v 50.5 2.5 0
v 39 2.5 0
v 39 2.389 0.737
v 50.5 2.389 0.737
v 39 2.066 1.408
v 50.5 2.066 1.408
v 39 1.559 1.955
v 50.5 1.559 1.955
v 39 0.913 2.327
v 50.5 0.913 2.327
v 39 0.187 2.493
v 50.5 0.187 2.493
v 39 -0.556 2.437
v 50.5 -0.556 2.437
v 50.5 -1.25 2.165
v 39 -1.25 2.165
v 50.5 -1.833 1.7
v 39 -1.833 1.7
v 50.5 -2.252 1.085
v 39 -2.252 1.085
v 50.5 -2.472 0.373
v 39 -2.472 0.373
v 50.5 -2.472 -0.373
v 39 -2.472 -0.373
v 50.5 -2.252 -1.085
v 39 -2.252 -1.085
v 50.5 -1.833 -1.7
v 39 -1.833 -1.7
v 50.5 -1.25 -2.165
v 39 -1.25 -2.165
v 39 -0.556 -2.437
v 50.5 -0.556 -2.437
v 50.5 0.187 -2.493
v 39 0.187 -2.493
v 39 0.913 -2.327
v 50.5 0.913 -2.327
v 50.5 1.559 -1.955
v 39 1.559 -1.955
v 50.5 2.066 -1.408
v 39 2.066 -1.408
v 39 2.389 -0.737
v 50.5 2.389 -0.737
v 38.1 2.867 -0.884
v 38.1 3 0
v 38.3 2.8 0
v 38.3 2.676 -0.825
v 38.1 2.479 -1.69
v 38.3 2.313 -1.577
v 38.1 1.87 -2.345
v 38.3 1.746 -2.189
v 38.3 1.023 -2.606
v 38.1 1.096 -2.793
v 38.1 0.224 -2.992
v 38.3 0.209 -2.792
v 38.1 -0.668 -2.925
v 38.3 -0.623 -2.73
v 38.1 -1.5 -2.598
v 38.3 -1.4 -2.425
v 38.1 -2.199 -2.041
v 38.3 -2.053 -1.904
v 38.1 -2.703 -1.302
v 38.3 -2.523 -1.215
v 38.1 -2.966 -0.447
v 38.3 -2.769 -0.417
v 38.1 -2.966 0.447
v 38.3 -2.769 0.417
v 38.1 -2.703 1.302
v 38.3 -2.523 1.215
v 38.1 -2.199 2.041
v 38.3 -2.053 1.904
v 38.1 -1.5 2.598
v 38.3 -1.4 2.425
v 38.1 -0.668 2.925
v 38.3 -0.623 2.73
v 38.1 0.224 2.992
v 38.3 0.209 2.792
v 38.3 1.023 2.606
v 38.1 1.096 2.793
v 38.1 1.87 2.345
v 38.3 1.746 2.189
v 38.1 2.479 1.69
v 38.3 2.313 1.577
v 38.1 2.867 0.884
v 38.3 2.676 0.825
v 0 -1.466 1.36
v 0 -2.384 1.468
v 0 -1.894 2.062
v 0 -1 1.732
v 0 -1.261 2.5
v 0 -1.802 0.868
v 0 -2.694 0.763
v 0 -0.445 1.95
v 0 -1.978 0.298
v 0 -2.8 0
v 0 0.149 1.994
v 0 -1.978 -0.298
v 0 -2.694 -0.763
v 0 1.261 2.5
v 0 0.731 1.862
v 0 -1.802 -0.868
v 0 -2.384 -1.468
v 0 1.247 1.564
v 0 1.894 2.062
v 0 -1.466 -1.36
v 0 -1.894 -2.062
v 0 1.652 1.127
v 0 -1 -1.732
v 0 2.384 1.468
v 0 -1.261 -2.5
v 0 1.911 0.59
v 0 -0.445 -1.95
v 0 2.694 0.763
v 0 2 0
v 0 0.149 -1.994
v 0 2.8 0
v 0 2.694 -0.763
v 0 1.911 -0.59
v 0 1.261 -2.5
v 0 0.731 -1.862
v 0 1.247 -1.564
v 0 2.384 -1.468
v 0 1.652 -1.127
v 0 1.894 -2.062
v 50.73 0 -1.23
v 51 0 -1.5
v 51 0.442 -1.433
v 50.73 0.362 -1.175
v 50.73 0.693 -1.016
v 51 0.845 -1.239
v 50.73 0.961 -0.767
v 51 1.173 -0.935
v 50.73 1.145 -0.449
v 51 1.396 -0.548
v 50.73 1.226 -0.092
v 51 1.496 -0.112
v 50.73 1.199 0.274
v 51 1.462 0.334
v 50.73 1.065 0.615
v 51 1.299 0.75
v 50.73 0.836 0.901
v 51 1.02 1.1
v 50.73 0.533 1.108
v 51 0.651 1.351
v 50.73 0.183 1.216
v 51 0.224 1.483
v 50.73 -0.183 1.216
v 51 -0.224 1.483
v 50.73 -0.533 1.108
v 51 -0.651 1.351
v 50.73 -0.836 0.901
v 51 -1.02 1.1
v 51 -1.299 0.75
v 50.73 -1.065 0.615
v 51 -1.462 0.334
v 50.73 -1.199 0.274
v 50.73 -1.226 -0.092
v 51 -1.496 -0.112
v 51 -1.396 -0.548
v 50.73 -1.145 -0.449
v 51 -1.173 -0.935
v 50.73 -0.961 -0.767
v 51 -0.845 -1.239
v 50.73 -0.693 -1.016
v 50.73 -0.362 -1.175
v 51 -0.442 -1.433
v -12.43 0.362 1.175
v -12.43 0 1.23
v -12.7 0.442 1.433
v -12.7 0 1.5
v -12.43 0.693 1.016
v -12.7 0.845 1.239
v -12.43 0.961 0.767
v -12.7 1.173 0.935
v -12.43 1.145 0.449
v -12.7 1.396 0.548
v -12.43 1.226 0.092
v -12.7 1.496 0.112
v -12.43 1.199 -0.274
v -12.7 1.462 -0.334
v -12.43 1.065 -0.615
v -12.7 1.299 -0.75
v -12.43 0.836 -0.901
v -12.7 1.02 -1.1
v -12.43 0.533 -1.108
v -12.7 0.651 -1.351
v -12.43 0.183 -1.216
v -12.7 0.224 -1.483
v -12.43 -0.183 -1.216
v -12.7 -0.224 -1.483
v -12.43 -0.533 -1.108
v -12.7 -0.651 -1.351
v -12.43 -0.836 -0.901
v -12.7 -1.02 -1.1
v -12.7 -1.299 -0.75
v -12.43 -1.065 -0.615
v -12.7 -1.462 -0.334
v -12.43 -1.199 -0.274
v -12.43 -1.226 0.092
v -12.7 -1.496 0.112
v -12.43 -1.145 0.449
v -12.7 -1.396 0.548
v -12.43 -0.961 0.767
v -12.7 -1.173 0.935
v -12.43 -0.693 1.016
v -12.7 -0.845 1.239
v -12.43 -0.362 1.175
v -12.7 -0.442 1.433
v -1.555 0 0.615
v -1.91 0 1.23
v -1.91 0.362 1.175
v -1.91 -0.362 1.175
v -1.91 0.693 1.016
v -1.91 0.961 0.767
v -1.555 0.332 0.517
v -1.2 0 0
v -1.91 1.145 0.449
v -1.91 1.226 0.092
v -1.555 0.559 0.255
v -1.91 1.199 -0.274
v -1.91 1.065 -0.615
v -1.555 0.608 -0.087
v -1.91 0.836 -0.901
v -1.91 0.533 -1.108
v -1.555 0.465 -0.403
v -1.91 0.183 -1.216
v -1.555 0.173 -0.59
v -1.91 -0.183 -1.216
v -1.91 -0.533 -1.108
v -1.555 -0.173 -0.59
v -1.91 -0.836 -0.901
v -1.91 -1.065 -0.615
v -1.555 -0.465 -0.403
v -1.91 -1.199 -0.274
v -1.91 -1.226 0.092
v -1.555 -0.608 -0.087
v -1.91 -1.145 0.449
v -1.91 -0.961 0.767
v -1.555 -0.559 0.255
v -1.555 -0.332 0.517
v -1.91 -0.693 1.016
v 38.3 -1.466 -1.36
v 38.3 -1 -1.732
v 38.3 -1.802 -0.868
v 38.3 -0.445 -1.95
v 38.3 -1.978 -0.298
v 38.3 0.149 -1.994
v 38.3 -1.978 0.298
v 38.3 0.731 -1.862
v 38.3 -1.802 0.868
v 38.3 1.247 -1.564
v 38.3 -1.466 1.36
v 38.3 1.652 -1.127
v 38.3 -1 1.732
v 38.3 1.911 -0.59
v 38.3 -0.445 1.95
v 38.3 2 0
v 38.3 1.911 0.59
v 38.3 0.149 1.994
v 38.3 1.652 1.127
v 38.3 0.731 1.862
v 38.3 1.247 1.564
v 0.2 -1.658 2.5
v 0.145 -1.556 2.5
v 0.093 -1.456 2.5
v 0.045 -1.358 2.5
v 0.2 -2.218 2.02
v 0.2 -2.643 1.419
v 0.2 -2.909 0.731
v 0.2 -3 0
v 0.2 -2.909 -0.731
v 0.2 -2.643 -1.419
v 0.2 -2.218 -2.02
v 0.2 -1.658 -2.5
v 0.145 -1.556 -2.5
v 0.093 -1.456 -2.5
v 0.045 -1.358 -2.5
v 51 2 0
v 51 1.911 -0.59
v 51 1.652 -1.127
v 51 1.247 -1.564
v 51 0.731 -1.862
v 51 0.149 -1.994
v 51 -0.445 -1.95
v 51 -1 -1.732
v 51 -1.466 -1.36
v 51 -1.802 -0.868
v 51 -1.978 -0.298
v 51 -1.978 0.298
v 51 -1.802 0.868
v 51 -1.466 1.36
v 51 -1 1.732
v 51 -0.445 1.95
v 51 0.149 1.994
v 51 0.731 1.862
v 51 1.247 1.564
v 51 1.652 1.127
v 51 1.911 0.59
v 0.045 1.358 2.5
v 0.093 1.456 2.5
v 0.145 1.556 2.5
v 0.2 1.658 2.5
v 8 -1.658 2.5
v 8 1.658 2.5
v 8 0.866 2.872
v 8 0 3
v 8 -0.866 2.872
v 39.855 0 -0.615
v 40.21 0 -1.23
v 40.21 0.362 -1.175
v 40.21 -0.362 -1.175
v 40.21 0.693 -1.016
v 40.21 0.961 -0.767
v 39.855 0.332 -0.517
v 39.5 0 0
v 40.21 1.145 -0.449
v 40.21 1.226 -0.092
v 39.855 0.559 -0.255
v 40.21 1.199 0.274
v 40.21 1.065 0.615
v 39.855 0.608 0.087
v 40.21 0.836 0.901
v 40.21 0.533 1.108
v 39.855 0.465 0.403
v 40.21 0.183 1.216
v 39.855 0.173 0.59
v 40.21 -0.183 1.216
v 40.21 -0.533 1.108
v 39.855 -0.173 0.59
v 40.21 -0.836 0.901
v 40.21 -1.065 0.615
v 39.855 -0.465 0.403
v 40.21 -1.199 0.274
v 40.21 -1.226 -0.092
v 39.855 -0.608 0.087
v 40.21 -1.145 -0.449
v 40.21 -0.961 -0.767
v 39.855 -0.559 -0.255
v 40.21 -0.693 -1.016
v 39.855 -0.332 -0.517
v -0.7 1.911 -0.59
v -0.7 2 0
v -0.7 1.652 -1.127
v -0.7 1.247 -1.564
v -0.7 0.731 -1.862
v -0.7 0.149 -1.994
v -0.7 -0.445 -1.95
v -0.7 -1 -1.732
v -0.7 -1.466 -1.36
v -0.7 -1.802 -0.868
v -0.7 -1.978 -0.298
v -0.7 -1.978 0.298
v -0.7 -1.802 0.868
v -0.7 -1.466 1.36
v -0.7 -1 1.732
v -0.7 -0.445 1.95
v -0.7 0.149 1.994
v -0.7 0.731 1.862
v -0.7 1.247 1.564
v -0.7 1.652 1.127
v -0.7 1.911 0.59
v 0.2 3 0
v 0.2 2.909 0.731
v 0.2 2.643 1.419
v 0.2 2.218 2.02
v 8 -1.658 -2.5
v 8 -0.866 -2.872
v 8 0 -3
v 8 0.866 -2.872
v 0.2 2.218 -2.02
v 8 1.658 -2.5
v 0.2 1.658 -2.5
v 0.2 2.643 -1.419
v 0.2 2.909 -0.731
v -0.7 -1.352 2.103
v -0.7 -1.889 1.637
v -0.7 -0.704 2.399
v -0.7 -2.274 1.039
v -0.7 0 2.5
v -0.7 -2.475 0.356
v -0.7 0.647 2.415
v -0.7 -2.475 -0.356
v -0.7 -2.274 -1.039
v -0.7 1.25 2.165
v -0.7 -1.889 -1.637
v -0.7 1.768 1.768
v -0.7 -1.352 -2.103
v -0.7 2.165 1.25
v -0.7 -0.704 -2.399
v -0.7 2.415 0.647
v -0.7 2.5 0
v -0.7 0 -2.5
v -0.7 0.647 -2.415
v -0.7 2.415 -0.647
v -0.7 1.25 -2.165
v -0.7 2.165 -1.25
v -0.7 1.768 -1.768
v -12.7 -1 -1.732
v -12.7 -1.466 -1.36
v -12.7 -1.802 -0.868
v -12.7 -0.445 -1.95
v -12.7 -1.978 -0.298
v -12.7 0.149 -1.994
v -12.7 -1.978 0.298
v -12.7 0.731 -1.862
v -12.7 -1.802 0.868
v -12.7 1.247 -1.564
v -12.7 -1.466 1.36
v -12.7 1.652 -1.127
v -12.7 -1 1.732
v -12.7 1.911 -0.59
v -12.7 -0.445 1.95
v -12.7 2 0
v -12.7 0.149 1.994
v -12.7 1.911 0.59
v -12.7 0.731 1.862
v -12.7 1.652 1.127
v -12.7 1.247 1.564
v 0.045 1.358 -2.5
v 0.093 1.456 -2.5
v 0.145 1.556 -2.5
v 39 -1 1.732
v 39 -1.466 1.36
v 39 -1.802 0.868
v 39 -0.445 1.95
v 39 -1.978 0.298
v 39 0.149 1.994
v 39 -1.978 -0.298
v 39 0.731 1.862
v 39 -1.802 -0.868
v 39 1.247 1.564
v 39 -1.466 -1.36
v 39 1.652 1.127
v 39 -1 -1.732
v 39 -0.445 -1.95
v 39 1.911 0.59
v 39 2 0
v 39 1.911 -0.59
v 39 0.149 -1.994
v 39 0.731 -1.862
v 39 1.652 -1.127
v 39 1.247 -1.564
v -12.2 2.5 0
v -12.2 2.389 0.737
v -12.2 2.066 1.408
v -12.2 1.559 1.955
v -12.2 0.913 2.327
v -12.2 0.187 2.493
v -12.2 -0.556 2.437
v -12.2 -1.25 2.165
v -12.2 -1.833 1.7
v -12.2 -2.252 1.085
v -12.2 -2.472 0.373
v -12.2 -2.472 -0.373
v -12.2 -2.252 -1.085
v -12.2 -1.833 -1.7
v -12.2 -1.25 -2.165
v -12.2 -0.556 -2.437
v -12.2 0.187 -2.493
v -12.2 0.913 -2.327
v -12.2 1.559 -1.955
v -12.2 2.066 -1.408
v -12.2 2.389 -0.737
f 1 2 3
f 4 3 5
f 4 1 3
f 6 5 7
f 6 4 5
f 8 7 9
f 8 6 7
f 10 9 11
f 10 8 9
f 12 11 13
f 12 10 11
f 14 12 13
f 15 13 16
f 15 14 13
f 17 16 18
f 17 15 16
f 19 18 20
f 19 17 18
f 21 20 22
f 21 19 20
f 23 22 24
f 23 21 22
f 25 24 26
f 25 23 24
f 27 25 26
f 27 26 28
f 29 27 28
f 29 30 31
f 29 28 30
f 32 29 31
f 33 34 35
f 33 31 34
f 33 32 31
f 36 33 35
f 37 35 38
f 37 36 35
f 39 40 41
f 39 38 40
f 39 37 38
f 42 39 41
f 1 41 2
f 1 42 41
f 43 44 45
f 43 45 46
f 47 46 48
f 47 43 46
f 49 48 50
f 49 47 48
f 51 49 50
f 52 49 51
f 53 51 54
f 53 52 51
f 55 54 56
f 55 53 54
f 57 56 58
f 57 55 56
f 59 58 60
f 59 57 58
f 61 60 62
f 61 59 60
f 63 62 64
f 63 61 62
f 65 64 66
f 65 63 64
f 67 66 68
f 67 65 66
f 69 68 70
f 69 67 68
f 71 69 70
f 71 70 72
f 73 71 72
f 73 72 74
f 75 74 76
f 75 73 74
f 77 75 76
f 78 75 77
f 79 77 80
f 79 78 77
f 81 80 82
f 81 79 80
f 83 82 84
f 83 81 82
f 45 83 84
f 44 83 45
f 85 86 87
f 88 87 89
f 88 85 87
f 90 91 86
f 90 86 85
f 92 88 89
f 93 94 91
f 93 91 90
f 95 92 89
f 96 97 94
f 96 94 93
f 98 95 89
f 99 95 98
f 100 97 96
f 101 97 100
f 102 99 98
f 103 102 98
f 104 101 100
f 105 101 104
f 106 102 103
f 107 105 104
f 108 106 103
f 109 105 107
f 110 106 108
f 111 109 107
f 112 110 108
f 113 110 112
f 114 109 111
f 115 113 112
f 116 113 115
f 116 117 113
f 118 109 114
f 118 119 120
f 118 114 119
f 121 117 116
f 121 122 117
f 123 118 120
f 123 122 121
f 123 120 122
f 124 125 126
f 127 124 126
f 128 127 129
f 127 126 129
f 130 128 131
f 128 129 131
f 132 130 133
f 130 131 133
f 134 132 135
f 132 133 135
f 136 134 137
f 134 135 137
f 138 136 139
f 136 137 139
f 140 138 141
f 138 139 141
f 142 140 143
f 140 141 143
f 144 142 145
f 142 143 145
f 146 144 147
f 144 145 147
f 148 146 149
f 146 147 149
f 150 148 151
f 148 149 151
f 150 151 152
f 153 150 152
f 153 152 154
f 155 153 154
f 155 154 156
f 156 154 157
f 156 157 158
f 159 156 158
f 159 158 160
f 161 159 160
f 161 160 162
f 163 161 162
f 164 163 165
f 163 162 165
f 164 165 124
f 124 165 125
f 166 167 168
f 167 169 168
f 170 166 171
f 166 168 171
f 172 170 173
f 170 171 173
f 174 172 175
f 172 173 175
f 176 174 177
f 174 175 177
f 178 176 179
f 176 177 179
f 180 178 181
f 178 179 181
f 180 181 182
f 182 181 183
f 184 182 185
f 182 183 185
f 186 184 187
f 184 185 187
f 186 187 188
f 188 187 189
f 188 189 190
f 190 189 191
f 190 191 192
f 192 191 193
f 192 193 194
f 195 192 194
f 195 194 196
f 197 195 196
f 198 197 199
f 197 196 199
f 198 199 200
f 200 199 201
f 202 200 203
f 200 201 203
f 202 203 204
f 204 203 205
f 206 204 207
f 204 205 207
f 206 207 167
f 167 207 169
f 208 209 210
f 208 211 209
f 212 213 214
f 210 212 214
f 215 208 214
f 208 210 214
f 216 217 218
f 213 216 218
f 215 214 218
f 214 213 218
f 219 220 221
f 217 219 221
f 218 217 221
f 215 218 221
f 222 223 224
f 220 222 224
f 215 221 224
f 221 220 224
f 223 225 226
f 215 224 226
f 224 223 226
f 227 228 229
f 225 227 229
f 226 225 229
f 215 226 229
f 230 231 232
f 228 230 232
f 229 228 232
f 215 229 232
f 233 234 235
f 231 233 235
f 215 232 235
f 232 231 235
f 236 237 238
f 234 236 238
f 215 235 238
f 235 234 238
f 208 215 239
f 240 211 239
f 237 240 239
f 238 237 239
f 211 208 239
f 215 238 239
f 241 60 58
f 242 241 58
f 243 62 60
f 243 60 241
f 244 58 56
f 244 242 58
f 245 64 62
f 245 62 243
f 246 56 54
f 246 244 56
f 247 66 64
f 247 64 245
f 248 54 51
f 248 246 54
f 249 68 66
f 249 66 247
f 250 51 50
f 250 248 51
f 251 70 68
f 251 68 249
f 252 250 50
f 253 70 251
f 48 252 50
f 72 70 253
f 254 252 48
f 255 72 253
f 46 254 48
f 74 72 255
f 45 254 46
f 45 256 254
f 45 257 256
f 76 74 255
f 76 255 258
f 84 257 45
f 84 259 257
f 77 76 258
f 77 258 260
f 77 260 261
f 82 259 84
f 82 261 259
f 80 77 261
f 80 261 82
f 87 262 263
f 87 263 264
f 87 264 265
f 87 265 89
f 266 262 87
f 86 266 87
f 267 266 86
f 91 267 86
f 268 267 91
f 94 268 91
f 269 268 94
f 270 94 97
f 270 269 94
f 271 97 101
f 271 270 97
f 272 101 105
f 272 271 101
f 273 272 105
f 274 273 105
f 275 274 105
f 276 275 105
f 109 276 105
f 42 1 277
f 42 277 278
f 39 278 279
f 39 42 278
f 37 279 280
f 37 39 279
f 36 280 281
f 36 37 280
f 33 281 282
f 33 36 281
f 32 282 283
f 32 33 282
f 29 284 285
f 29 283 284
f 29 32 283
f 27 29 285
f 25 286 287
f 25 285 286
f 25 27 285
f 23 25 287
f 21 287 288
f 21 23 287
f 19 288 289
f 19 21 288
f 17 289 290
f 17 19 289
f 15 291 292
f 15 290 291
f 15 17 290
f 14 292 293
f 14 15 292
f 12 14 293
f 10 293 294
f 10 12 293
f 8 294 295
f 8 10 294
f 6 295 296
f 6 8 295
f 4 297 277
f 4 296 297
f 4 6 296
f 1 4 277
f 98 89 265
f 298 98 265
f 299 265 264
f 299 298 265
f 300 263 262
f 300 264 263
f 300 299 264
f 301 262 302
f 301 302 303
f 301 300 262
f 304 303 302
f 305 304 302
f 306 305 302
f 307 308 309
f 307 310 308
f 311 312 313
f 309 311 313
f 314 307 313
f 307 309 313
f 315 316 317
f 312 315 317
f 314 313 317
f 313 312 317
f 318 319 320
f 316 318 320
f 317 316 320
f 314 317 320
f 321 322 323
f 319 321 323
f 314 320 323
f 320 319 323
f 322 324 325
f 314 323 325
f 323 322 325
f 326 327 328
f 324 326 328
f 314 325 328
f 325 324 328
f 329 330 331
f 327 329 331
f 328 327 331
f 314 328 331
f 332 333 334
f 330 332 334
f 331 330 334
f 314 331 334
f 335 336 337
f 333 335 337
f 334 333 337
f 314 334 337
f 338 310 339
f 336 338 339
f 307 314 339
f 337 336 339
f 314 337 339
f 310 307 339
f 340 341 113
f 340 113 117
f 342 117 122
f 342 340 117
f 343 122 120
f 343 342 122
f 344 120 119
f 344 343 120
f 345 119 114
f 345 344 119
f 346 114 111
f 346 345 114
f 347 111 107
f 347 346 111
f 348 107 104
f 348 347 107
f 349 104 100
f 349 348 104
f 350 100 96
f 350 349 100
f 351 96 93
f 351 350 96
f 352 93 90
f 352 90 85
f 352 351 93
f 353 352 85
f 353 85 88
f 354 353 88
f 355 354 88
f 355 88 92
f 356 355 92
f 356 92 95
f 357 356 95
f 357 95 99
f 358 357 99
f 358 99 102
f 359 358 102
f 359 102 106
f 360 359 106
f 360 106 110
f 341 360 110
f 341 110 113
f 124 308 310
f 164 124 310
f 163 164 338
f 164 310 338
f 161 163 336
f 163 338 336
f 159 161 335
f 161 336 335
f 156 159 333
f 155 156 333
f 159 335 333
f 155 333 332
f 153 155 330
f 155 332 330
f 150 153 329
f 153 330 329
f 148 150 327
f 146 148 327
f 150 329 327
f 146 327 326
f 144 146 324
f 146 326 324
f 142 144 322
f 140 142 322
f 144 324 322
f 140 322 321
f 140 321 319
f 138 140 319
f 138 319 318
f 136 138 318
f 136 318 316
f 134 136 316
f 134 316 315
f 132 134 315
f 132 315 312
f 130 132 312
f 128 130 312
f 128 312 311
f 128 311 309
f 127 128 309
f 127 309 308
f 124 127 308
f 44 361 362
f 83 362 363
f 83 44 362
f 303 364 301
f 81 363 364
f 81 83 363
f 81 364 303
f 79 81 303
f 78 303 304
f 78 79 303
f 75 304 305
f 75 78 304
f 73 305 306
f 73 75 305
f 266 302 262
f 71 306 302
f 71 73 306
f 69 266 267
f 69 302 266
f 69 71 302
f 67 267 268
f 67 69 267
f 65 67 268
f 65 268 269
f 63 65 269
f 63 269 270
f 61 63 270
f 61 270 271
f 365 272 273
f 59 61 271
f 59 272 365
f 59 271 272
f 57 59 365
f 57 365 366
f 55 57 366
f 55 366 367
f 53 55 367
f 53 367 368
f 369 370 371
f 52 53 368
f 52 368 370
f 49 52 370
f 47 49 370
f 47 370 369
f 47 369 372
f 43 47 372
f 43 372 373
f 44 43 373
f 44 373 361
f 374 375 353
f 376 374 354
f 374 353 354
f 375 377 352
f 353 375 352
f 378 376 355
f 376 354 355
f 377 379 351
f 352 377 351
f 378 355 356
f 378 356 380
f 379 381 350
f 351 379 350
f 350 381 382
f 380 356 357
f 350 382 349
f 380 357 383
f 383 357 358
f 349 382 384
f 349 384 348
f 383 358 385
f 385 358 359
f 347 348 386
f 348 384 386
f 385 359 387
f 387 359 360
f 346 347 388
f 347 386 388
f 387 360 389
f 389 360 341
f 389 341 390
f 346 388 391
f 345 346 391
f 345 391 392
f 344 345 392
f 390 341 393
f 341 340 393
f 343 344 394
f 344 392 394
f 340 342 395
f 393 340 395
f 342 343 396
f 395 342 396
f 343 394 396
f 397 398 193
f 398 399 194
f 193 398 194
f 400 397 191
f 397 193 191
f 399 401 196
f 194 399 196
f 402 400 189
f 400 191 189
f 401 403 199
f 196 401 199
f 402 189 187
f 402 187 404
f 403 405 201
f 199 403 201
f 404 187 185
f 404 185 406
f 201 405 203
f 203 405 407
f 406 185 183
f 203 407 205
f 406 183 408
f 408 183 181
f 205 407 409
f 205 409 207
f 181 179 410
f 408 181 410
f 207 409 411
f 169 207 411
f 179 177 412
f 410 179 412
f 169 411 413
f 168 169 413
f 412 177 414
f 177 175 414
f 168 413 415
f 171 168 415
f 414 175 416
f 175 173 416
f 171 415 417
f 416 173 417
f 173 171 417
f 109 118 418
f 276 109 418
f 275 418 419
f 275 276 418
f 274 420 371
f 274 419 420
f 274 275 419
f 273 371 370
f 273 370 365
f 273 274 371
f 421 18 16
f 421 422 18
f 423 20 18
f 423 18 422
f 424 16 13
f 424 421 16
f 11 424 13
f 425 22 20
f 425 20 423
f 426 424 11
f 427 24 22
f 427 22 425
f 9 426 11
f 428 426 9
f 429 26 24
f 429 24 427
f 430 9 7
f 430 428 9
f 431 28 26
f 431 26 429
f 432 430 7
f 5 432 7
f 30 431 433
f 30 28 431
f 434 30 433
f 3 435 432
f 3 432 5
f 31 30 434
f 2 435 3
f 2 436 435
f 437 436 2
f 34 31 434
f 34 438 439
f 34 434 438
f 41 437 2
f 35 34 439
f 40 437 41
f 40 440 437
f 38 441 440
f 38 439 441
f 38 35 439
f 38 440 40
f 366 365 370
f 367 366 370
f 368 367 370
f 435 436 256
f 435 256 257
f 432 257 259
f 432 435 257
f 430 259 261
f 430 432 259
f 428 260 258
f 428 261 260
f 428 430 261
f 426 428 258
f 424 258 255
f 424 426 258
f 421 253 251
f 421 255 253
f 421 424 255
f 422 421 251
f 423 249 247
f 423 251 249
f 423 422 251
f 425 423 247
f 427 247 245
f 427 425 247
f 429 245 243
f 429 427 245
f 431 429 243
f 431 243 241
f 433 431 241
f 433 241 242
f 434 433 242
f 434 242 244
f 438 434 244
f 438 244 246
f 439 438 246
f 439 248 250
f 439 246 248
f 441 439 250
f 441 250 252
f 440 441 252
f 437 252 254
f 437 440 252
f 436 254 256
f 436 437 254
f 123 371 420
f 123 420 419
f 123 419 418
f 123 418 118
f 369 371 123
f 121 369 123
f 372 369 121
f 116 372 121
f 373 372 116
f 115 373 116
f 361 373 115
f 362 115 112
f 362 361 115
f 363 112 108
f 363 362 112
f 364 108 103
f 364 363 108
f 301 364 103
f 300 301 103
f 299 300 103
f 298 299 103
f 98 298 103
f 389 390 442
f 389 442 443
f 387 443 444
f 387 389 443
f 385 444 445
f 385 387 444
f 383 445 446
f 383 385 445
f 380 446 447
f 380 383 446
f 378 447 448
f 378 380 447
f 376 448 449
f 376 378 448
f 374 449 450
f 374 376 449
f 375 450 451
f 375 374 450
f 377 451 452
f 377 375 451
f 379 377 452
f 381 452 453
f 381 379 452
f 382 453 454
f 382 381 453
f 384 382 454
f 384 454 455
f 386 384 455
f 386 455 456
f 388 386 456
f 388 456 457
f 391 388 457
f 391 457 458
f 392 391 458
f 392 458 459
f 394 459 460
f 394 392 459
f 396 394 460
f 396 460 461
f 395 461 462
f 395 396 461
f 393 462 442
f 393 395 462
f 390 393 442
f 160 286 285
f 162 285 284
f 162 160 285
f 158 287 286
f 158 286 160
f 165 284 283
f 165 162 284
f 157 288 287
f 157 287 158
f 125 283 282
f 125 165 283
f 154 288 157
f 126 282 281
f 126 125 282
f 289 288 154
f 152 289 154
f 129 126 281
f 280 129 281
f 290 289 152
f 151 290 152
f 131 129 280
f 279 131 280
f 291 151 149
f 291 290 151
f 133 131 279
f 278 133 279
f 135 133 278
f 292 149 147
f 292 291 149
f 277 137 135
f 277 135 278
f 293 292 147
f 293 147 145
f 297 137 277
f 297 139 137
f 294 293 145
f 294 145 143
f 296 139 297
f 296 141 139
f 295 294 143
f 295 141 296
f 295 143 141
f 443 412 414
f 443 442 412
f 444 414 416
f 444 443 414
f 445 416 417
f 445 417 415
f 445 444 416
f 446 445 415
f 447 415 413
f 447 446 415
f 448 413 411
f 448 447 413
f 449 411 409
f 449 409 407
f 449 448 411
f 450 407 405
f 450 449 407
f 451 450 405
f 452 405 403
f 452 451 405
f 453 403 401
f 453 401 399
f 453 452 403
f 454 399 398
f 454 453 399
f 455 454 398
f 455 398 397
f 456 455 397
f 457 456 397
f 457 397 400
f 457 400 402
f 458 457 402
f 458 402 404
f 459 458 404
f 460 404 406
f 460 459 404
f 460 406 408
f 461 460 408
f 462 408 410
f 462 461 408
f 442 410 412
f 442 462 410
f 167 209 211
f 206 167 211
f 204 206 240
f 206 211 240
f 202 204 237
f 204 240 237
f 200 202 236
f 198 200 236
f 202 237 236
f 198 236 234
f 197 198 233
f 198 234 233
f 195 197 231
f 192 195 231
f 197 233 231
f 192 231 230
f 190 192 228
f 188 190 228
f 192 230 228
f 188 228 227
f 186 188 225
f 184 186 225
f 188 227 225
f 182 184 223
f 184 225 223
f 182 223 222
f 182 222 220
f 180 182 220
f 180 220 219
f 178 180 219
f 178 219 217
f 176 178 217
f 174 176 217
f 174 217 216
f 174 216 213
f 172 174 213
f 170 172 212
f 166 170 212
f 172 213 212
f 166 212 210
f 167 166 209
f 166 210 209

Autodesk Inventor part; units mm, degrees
ref_plane "YZ Plane" through (0, 0, 0) normal (1, 0, 0) x (0, 1, 0)
ref_plane "XZ Plane" through (0, 0, 0) normal (0, 1, 0) x (-1, 0, 0)
ref_plane "XY Plane" through (0, 0, 0) normal (0, 0, 1) x (1, 0, 0)
sketch "Sketch_1" plane through (0, 0, 0) normal (0, 0, 1) x (1, 0, 0)
  line L0 (51, 0) -> (-12.7, 0)
  line L1 (-12.7, 0) -> (-12.7, 2)
  line L2 (-12.7, 2) -> (-12.2, 2.5)
  line L3 (-12.2, 2.5) -> (-0.2, 2.5)
  arc A0 (-0.2, 2.5) -> (0, 2.7) centre (-0.2, 2.7) ccw
  line L4 (0, 2.7) -> (0, 2.8)
  line L5 (0, 2.8) -> (0.2, 3)
  line L6 (0.2, 3) -> (38.1, 3)
  line L7 (38.1, 3) -> (38.3, 2.8)
  line L8 (38.3, 2.8) -> (38.3, 2.7)
  arc A1 (38.3, 2.7) -> (38.5, 2.5) centre (38.5, 2.7) ccw
  line L9 (38.5, 2.5) -> (50.5, 2.5)
  line L10 (50.5, 2.5) -> (51, 2)
  line L11 (51, 2) -> (51, 0)
  line L12 (51, 0) -> (-12.7, 0)
  line L13 (38.3, 2.7) -> (38.3, 2)
  line L14 (38.3, 2) -> (39, 2)
  line L15 (39, 2) -> (39, 2.5)
  line L16 (0, 2.7) -> (0, 2)
  line L17 (0, 2) -> (-0.7, 2)
  line L18 (-0.7, 2) -> (-0.7, 2.5)
  dimension "d17" = 0.7
  dimension "d18" = 2
  dimension "d20" = 0.7
  dimension "d21" = 2
revolve "Revolution1" add sketch "Sketch_1" angle 360 about axis through (51, 0, 0) along (1, 0, 0)
sketch "Sketch2" plane through (-12.7, 0, 0) normal (-1, 0, 0) x (0, 0, 1)
  point P0 (0, 0)
hole "Hole1" at (-12.7, 0, 0) direction (1, 0, 0) diameter 2.459 depth 10.7901 tip angle 120 countersink diameter 3 countersink angle 90 thread size "M3x0.5" class "6H" standard "ISO Metric profile"
sketch "Sketch3" plane through (51, 0, 0) normal (1, 0, 0) x (0, 0, -1)
  point P0 (0, 0)
hole "Hole2" at (51, 0, 0) direction (-1, 0, 0) diameter 2.459 depth 10.7901 tip angle 120 countersink diameter 3 countersink angle 90 thread size "M3x0.5" class "6H" standard "ISO Metric profile"
sketch "Sketch_28" plane through (0, 0, 0) normal (1, 0, 0) x (0, 0, -1)
  line L0 (-5, -6) -> (5, -6)
  line L1 (5, -6) -> (5, 3)
  line L2 (5, 3) -> (2.5, 3)
  line L3 (2.5, 3) -> (2.5, -3)
  line L4 (2.5, -3) -> (-2.5, -3)
  line L5 (-2.5, -3) -> (-2.5, 3)
  line L6 (-2.5, 3) -> (-5, 3)
  line L7 (-5, 3) -> (-5, -6)
extrude "Extrusion1" cut sketch "Sketch_28" along normal mid plane 16
revolve "回転2" cut sketch "Sketch_1" angle 360 about axis through (51, 0, 0) along (-1, 0, 0) contours L15 L14 L13 A1 L9 | L3 A0 L16 L17 L18
properties part number "SSFRMHHS6-38.3-F12.7-P5-T12.7-M3-SC0-TF12.7-TT12.7"
